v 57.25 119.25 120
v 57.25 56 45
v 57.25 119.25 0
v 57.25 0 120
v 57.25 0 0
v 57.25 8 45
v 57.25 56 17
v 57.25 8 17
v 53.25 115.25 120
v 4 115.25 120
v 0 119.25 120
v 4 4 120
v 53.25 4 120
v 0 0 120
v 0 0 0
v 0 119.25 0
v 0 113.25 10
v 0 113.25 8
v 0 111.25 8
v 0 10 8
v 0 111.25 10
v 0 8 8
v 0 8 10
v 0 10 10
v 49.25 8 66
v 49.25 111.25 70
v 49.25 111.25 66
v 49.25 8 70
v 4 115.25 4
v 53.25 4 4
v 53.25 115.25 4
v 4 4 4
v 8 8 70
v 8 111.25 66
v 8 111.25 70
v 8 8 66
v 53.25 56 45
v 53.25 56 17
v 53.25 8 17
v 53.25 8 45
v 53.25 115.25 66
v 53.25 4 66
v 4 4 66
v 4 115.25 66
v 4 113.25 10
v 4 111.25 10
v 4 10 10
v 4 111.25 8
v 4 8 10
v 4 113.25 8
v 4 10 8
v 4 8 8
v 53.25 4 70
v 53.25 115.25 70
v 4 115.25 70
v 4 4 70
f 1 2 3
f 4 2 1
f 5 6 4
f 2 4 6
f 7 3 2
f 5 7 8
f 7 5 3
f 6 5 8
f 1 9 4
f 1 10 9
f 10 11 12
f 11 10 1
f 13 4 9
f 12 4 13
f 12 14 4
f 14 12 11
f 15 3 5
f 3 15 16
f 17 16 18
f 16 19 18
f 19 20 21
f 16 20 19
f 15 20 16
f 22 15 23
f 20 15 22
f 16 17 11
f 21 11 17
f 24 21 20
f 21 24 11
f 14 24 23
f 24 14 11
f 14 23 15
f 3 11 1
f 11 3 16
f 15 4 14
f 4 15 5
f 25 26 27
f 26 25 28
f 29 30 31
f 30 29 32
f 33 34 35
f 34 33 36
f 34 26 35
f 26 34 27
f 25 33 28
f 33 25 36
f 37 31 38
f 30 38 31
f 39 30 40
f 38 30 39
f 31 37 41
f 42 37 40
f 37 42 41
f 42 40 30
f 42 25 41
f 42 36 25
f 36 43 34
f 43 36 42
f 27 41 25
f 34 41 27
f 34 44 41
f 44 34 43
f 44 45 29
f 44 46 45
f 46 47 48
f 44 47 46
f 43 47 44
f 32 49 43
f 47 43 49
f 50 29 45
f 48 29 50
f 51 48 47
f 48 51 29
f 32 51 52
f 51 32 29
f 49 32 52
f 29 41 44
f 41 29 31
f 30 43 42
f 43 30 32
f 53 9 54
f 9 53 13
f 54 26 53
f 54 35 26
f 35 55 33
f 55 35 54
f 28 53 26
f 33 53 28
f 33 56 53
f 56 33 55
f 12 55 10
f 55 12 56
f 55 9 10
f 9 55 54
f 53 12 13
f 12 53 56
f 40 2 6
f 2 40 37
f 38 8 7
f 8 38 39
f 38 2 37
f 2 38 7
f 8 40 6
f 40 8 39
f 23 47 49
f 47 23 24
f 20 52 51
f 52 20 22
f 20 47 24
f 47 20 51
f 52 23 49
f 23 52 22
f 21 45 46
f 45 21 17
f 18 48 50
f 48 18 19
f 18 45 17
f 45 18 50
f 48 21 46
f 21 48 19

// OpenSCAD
supply_width = 49.25;
supply_depth = 111.25;
base_height = 120;

plug_width = 48;
plug_height = 28;
plug_margin = 17;

margin = 4;

difference() {

  // basic cube
  cube([
    supply_width + 2*margin,
    supply_depth + 2*margin,
    base_height
  ]);


  // remove the inside of the cube
  translate([2*margin, 2*margin, margin]){
    cube([
      supply_width - 2*margin,
      supply_depth - 2*margin,
      base_height,
    ]);
  }

  translate([margin, margin, margin]){
    cube([
      supply_width,
      supply_depth,
      plug_height + 2*plug_margin,
    ]);
  }

  translate([margin, margin, plug_height + 2*plug_margin + 2*margin]) {
    cube([
      supply_width,
      supply_depth,
      base_height
    ]);
  }

  // remove the hole for the plug
  translate([supply_width + margin, 2*margin, plug_margin]) {
    cube([margin, plug_width, plug_height]);
  }

  // remove screw holes
  translate([0, 2*margin, 2*margin]) {
    cube([margin, 2, 2]);
  }
  translate([0, supply_depth, 2*margin]) {
    cube([margin, 2, 2]);
  }
}
